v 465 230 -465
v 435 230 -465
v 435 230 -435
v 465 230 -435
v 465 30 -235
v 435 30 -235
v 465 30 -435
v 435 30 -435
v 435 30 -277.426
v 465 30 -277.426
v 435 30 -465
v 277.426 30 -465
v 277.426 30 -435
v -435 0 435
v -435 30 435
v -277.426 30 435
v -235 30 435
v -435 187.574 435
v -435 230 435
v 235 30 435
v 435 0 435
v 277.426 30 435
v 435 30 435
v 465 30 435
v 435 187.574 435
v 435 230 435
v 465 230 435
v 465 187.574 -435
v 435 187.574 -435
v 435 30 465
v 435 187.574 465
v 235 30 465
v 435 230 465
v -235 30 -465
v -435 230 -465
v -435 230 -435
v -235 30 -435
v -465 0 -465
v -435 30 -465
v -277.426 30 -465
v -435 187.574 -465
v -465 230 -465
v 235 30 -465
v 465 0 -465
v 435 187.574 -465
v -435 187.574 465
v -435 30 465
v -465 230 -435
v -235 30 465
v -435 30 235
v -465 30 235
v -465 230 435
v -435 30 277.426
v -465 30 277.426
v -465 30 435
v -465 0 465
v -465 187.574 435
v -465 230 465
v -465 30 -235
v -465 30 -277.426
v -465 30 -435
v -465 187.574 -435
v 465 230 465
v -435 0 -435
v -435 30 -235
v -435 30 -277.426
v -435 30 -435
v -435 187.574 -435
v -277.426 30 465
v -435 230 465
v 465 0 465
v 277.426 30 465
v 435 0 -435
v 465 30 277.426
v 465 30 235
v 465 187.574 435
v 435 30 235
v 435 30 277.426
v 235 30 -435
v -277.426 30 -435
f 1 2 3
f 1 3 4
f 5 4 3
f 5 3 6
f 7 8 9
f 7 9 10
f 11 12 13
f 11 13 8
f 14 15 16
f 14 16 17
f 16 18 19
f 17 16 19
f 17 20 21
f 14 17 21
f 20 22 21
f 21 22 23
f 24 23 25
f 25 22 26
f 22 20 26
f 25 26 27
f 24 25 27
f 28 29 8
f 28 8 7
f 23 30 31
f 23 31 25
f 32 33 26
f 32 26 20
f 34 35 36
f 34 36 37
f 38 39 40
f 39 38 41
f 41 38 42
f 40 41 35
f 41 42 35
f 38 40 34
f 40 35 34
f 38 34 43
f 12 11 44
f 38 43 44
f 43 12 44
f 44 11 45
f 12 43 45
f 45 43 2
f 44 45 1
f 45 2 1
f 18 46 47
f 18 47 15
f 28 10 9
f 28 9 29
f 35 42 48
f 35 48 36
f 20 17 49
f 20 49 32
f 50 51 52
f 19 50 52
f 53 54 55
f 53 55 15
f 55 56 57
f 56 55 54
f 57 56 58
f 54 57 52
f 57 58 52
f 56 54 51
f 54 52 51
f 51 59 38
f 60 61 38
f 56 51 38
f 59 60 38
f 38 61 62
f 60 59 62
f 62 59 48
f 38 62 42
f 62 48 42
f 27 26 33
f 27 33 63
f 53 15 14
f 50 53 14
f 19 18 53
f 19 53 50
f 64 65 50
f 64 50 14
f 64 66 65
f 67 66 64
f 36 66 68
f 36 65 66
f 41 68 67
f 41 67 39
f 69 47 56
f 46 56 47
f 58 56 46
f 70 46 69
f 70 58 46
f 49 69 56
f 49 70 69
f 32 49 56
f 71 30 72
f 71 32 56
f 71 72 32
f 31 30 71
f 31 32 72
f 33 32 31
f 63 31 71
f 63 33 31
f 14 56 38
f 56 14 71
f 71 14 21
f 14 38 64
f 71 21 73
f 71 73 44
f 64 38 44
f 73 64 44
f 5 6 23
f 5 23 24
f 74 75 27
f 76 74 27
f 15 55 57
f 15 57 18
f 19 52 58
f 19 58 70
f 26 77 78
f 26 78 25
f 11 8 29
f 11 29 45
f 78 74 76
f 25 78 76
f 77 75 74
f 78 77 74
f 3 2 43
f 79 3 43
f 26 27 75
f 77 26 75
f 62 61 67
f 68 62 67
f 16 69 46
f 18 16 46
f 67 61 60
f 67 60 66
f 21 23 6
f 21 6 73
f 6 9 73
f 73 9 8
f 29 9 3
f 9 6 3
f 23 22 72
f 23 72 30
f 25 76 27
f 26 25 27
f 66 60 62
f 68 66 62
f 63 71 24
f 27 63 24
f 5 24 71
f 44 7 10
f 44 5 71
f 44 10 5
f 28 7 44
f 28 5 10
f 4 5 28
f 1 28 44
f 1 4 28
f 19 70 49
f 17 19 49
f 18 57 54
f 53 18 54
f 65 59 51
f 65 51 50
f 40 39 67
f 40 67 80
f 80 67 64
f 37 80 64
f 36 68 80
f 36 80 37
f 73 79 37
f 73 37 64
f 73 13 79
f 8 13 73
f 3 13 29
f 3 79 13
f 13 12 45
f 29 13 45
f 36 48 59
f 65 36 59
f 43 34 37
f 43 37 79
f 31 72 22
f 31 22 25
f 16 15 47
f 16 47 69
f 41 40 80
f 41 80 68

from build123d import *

# Parameters (mm, degrees)
SKETCH1_W            = 930
SKETCH1_H            = 930
SKETCH1_W_2          = 870
SKETCH1_H_2          = 870
BOSS_EXTRUDE1_DEPTH  = 30
SKETCH2_W            = 30
SKETCH2_H            = 30
BOSS_EXTRUDE2_DEPTH  = 200
BOSS_EXTRUDE3_DEPTH  = 30
BOSS_EXTRUDE4_DEPTH  = 30
BOSS_EXTRUDE5_DEPTH  = 30
BOSS_EXTRUDE6_DEPTH  = 30
BOSS_EXTRUDE7_DEPTH  = 30
BOSS_EXTRUDE8_DEPTH  = 30
BOSS_EXTRUDE9_DEPTH  = 30
BOSS_EXTRUDE10_DEPTH = 30


with BuildPart() as part:
    # Sketch1 → Boss-Extrude1 (new body)
    with BuildSketch(Plane(origin=(0, 0, 0), x_dir=(1, 0, 0), z_dir=(0, 1, 0))):
        Rectangle(SKETCH1_W, SKETCH1_H)
        Rectangle(SKETCH1_W_2, SKETCH1_H_2, mode=Mode.SUBTRACT)
    extrude(amount=BOSS_EXTRUDE1_DEPTH)

    # Sketch2 → Boss-Extrude2 (add)
    with BuildSketch(Plane(origin=(0, 30, 0), x_dir=(1, 0, 0), z_dir=(0, 1, 0))):
        with Locations((-450, 450)):
            Rectangle(SKETCH2_W, SKETCH2_H)
        with Locations((450, 450)):
            Rectangle(SKETCH2_W, SKETCH2_H)
        with Locations((450, -450)):
            Rectangle(SKETCH2_W, SKETCH2_H)
        with Locations((-450, -450)):
            Rectangle(SKETCH2_W, SKETCH2_H)
    extrude(amount=BOSS_EXTRUDE2_DEPTH)

    # Sketch4 → Boss-Extrude3 (add)
    with BuildSketch(Plane.ZY.offset(465)):
        Polygon((435, 187.573593129), (277.426406871, 30), (235, 30), (435, 230), align=None)
    extrude(amount=-BOSS_EXTRUDE3_DEPTH)

    # Sketch5 → Boss-Extrude4 (add)
    with BuildSketch(Plane.ZY.offset(465)):
        Polygon((-435, 187.573593129), (-435, 230), (-235, 30), (-277.426406871, 30), align=None)
    extrude(amount=-BOSS_EXTRUDE4_DEPTH)

    # Sketch6 → Boss-Extrude5 (add)
    with BuildSketch(Plane(origin=(0, 0, -465), x_dir=(-1, 0, 0), z_dir=(0, 0, -1))):
        Polygon((435, 230), (235, 30), (277.426406871, 30), (435, 187.573593129), align=None)
    extrude(amount=-BOSS_EXTRUDE5_DEPTH)

    # Sketch7 → Boss-Extrude6 (add)
    with BuildSketch(Plane(origin=(0, 0, -465), x_dir=(-1, 0, 0), z_dir=(0, 0, -1))):
        Polygon((-435, 230), (-235, 30), (-277.426406871, 30), (-435, 187.573593129), align=None)
    extrude(amount=-BOSS_EXTRUDE6_DEPTH)

    # Sketch8 → Boss-Extrude7 (add)
    with BuildSketch(Plane.XY.offset(465)):
        Polygon((-435, 230), (-235, 30), (-277.426406871, 30), (-435, 187.573593129), align=None)
    extrude(amount=-BOSS_EXTRUDE7_DEPTH)

    # Sketch9 → Boss-Extrude8 (add)
    with BuildSketch(Plane.XY.offset(465)):
        Polygon((435, 230), (235, 30), (277.426406871, 30), (435, 187.573593129), align=None)
    extrude(amount=-BOSS_EXTRUDE8_DEPTH)

    # Sketch11 → Boss-Extrude10 (add)
    with BuildSketch(Plane(origin=(465, 0, 0), x_dir=(0, 0, -1), z_dir=(1, 0, 0))):
        Polygon((435, 230), (235, 30), (277.426406871, 30), (435, 187.573593129), align=None)
    extrude(amount=-BOSS_EXTRUDE10_DEPTH)


with BuildPart() as body_2:
    # Sketch10 → Boss-Extrude9 (new body)
    with BuildSketch(Plane(origin=(465, 0, 0), x_dir=(0, 0, -1), z_dir=(1, 0, 0))):
        Polygon((-435, 230), (-235, 30), (-277.426406871, 30), (-435, 187.573593129), align=None)
    extrude(amount=-BOSS_EXTRUDE9_DEPTH)


solid = Compound([part.part, body_2.part])
